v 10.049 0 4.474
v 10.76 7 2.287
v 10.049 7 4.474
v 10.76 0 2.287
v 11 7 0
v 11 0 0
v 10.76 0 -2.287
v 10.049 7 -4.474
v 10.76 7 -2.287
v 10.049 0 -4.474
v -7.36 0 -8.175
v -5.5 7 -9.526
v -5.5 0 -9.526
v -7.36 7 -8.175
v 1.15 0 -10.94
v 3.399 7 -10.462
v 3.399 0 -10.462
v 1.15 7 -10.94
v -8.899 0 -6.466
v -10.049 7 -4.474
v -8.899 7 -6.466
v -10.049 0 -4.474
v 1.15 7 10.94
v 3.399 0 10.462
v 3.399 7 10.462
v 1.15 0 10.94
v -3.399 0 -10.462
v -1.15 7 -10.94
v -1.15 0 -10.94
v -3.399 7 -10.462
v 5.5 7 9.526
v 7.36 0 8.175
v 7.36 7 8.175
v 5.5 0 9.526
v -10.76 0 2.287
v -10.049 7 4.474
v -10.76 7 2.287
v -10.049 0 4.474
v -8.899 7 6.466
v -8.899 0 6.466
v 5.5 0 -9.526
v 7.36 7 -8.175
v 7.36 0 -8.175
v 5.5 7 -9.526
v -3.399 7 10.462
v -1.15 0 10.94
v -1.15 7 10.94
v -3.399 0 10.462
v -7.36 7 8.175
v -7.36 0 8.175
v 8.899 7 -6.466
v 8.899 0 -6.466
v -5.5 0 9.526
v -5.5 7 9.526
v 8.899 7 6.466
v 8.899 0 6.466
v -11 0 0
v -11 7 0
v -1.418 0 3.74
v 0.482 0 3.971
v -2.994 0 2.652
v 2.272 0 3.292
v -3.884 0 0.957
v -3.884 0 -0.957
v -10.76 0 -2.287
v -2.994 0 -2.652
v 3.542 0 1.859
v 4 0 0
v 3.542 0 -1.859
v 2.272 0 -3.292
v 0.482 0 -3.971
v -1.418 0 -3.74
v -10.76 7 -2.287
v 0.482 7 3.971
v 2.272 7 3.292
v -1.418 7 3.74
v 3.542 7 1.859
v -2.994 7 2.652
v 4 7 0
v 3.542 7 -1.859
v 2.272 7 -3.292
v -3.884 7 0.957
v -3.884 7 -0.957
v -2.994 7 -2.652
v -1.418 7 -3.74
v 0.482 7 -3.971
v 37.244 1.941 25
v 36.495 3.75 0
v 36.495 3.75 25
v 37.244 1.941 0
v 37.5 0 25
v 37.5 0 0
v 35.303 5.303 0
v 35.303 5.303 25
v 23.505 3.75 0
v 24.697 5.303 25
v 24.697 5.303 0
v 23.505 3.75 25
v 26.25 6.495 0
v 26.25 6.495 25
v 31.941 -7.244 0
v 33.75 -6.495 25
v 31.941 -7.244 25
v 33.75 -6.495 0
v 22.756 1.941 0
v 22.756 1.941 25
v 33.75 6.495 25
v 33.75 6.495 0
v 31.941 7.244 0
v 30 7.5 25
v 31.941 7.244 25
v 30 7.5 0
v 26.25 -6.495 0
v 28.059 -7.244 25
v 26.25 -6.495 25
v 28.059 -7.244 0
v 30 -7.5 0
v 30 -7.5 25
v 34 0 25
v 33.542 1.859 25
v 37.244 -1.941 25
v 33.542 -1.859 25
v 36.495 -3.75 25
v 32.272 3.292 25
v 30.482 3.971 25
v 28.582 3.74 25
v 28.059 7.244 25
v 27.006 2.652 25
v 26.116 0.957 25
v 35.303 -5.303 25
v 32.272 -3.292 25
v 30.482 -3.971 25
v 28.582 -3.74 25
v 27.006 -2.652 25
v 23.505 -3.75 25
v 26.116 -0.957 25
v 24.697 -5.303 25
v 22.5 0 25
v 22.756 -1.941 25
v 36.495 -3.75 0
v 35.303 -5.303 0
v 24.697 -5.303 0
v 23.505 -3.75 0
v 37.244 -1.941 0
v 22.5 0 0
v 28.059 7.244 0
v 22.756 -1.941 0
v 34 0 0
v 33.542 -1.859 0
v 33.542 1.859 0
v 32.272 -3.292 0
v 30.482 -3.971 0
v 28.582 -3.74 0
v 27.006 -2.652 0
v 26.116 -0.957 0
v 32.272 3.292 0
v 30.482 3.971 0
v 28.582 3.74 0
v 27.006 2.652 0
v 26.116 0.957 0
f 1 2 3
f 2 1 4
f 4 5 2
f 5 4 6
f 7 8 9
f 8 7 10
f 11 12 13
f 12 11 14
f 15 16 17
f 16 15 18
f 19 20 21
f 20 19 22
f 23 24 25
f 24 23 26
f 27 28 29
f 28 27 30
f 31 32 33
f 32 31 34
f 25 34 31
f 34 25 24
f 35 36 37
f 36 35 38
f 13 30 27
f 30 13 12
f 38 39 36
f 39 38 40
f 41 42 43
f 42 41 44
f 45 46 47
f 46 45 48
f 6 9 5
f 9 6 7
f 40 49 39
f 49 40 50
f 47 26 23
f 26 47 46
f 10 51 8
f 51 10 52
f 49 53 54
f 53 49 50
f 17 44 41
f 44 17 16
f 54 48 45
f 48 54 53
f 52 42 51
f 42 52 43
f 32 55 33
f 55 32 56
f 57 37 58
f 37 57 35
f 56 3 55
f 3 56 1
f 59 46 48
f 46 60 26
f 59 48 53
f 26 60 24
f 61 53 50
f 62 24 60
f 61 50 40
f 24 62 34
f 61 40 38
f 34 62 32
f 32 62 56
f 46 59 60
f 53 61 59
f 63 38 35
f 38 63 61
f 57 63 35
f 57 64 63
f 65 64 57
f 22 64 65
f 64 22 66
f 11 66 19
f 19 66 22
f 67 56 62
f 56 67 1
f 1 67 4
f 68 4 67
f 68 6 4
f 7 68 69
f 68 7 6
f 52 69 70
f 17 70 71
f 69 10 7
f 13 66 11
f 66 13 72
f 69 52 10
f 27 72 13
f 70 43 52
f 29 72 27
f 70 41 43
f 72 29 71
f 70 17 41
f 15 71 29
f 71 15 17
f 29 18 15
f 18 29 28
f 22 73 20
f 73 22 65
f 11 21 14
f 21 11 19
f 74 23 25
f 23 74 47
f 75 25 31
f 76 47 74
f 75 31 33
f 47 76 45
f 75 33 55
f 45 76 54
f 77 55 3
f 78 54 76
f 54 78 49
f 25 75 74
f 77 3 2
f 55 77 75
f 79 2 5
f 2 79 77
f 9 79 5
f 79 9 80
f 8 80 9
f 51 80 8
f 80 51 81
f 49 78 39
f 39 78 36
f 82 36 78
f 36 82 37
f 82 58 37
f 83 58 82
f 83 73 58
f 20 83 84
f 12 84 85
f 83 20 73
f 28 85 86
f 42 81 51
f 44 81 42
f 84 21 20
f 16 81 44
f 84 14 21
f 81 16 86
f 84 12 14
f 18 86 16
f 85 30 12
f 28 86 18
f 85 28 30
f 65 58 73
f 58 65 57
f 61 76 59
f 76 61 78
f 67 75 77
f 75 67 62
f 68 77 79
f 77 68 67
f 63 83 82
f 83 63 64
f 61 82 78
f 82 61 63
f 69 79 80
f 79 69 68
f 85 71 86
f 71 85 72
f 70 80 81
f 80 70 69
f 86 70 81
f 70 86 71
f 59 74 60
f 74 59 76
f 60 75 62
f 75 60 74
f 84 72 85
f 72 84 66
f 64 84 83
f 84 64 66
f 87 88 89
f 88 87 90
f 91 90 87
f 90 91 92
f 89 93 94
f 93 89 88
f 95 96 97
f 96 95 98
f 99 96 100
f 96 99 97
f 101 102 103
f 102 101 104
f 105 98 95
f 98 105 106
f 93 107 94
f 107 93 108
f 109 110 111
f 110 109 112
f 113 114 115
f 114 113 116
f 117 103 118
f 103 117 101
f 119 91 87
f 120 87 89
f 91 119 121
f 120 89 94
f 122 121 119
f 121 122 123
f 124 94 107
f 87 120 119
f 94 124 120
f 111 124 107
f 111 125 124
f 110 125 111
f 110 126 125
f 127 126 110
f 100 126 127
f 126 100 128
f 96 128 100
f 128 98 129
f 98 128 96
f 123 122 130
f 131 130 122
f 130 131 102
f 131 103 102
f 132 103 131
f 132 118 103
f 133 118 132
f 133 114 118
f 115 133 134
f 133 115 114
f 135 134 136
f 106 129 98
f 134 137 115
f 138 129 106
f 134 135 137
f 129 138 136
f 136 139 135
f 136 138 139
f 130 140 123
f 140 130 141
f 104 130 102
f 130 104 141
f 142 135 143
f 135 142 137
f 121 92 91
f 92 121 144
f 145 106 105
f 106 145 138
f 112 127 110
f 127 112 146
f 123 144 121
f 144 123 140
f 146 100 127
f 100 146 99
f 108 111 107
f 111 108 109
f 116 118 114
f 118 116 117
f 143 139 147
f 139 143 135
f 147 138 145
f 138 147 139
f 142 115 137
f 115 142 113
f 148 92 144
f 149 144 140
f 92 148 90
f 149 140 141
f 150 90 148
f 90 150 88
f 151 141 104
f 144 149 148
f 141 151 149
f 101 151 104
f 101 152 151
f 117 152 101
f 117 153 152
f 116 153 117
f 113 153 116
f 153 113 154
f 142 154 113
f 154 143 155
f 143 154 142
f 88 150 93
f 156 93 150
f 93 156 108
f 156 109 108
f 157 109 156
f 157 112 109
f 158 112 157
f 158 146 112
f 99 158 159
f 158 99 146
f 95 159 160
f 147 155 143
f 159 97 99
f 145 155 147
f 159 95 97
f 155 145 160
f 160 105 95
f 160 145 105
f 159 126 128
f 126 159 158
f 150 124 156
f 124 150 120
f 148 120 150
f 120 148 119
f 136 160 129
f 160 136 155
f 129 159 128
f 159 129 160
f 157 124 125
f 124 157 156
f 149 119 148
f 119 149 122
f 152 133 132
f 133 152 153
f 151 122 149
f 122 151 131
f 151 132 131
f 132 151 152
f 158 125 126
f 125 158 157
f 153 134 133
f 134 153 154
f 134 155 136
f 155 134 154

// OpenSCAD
steel = [0.8, 0.8, 0.9];

module bearing(id, od, w) {
    translate([0,w/2,0])
    color(steel) 
    render()
    rotate([90, 0, 0]) difference() {
		cylinder(h=w, r=od/2, center=true);
		cylinder(h=w*2, r=id/2, center=true);
    }
}

bearing(8, 22, 7); // 608 skateboard ball bearing.

module lm8uu() {
    translate([0,0,25/2])
    color(steel) render() difference() {
        cylinder(h=25, r=7.5, center=true);
        cylinder(h=30, r=4, center=true);
    }
}

module lm12uu() {
    translate([0,0,25/2])
    color(steel) render() difference() {
        cylinder(h=25, r=21/2, center=true);
        cylinder(h=30, r=6, center=true);
    }
}

translate([30, 0, 0]) lm8uu(); // Linear bearing for 8mm smooth rod.
